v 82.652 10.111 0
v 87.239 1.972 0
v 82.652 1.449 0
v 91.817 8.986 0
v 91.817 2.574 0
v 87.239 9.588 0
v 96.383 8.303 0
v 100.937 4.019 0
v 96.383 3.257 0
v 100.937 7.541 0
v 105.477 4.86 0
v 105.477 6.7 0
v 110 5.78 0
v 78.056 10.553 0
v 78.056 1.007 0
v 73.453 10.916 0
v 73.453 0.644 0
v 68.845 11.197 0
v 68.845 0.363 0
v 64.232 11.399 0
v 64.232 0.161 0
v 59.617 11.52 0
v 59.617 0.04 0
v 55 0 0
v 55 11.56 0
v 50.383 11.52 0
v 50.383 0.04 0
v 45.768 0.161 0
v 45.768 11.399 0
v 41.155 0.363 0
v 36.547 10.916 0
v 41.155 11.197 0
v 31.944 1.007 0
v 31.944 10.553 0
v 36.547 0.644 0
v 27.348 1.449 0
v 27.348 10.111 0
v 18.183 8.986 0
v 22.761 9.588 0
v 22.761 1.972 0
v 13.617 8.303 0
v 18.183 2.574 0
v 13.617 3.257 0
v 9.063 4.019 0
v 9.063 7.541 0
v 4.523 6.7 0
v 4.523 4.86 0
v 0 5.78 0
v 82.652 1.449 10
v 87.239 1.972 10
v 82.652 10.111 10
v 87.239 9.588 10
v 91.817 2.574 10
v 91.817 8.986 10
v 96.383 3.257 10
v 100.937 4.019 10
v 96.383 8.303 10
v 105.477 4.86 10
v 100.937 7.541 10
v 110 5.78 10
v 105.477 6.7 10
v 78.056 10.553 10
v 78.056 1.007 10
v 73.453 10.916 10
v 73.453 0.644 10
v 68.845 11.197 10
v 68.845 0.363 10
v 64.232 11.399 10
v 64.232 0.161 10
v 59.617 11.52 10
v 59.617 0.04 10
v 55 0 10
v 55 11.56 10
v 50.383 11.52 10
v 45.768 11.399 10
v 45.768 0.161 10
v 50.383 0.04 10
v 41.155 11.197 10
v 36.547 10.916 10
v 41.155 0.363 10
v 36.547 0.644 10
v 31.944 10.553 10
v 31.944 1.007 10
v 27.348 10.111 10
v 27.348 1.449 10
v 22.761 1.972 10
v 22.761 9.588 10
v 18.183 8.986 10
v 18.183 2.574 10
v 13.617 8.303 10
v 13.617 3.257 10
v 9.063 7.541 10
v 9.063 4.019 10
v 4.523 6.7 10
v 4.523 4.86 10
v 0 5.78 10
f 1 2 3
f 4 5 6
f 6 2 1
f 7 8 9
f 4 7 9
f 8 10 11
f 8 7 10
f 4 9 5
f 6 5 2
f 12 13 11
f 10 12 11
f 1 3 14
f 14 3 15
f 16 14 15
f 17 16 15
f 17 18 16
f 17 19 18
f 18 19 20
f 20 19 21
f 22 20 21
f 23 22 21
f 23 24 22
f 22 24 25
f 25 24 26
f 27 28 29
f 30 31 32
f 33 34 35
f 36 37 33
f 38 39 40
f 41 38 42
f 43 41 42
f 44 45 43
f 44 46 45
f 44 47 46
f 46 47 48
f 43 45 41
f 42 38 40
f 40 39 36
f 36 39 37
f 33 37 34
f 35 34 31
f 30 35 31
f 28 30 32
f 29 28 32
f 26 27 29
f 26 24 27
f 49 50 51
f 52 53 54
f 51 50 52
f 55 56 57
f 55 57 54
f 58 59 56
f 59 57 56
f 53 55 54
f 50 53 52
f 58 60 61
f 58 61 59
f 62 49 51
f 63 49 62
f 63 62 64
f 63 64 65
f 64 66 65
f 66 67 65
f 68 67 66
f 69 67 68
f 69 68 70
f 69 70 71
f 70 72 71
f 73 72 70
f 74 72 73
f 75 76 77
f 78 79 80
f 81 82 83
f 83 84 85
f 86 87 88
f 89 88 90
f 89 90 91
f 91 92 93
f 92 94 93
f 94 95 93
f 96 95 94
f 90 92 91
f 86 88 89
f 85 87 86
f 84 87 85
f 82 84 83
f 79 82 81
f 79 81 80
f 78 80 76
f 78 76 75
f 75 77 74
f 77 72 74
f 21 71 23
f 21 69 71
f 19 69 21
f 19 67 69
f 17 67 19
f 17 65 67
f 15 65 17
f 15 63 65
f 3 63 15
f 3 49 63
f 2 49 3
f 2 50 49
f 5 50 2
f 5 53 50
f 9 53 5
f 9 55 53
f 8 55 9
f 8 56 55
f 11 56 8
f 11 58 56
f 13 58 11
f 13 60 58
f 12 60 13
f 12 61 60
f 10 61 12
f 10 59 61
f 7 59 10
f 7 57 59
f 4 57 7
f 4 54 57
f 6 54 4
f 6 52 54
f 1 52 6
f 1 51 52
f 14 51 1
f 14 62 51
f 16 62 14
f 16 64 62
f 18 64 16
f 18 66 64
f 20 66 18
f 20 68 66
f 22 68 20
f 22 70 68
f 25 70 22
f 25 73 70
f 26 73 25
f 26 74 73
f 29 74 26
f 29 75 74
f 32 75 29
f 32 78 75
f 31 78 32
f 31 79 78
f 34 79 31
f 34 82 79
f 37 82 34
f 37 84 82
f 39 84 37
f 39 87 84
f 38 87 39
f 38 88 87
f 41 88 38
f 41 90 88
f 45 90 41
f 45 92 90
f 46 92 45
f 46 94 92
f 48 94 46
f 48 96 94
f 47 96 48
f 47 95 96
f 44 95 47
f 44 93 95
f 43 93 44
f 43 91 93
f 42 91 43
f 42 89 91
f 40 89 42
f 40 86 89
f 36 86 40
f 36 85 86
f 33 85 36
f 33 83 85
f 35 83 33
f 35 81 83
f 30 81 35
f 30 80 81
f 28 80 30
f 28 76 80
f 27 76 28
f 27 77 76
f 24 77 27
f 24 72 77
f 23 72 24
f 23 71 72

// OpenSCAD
$fn = 32;

// ----------------------------------------------------------------------
// Arc profile plate: lens, 48 points
// ----------------------------------------------------------------------

// --- parameters (mm) ---
lens_chord = 110;         // chord length of the lens, X
arc_r = 264.54;           // radius of both arcs
arc_angle = 24;           // angle of each arc, degrees
sagitta = 5.78;           // bulge of each arc (half the lens height)
arc_step = 1;             // sampling step of the arcs, degrees
plate_t = 10;             // plate thickness, Z
fit_tol = 0.1;            // declared fit tolerance (prompt contract)
free_tol = 0.5;           // declared free tolerance (prompt contract)

bbox_y = 2 * sagitta;  // full lens height

profile = [[110, 5.78], [105.477, 6.7], [100.937, 7.541], [96.383, 8.303], [91.817, 8.986], [87.239, 9.588], [82.652, 10.111], [78.056, 10.553], [73.453, 10.916], [68.845, 11.197], [64.232, 11.399], [59.617, 11.52], [55, 11.56], [50.383, 11.52], [45.768, 11.399], [41.155, 11.197], [36.547, 10.916], [31.944, 10.553], [27.348, 10.111], [22.761, 9.588], [18.183, 8.986], [13.617, 8.303], [9.063, 7.541], [4.523, 6.7], [0, 5.78], [4.523, 4.86], [9.063, 4.019], [13.617, 3.257], [18.183, 2.574], [22.761, 1.972], [27.348, 1.449], [31.944, 1.007], [36.547, 0.644], [41.155, 0.363], [45.768, 0.161], [50.383, 0.04], [55, 0], [59.617, 0.04], [64.232, 0.161], [68.845, 0.363], [73.453, 0.644], [78.056, 1.007], [82.652, 1.449], [87.239, 1.972], [91.817, 2.574], [96.383, 3.257], [100.937, 4.019], [105.477, 4.86]];  // primary outline, 48 points, counter clockwise

// --- the one profile operation ---
linear_extrude(height = plate_t) polygon(points = profile);
